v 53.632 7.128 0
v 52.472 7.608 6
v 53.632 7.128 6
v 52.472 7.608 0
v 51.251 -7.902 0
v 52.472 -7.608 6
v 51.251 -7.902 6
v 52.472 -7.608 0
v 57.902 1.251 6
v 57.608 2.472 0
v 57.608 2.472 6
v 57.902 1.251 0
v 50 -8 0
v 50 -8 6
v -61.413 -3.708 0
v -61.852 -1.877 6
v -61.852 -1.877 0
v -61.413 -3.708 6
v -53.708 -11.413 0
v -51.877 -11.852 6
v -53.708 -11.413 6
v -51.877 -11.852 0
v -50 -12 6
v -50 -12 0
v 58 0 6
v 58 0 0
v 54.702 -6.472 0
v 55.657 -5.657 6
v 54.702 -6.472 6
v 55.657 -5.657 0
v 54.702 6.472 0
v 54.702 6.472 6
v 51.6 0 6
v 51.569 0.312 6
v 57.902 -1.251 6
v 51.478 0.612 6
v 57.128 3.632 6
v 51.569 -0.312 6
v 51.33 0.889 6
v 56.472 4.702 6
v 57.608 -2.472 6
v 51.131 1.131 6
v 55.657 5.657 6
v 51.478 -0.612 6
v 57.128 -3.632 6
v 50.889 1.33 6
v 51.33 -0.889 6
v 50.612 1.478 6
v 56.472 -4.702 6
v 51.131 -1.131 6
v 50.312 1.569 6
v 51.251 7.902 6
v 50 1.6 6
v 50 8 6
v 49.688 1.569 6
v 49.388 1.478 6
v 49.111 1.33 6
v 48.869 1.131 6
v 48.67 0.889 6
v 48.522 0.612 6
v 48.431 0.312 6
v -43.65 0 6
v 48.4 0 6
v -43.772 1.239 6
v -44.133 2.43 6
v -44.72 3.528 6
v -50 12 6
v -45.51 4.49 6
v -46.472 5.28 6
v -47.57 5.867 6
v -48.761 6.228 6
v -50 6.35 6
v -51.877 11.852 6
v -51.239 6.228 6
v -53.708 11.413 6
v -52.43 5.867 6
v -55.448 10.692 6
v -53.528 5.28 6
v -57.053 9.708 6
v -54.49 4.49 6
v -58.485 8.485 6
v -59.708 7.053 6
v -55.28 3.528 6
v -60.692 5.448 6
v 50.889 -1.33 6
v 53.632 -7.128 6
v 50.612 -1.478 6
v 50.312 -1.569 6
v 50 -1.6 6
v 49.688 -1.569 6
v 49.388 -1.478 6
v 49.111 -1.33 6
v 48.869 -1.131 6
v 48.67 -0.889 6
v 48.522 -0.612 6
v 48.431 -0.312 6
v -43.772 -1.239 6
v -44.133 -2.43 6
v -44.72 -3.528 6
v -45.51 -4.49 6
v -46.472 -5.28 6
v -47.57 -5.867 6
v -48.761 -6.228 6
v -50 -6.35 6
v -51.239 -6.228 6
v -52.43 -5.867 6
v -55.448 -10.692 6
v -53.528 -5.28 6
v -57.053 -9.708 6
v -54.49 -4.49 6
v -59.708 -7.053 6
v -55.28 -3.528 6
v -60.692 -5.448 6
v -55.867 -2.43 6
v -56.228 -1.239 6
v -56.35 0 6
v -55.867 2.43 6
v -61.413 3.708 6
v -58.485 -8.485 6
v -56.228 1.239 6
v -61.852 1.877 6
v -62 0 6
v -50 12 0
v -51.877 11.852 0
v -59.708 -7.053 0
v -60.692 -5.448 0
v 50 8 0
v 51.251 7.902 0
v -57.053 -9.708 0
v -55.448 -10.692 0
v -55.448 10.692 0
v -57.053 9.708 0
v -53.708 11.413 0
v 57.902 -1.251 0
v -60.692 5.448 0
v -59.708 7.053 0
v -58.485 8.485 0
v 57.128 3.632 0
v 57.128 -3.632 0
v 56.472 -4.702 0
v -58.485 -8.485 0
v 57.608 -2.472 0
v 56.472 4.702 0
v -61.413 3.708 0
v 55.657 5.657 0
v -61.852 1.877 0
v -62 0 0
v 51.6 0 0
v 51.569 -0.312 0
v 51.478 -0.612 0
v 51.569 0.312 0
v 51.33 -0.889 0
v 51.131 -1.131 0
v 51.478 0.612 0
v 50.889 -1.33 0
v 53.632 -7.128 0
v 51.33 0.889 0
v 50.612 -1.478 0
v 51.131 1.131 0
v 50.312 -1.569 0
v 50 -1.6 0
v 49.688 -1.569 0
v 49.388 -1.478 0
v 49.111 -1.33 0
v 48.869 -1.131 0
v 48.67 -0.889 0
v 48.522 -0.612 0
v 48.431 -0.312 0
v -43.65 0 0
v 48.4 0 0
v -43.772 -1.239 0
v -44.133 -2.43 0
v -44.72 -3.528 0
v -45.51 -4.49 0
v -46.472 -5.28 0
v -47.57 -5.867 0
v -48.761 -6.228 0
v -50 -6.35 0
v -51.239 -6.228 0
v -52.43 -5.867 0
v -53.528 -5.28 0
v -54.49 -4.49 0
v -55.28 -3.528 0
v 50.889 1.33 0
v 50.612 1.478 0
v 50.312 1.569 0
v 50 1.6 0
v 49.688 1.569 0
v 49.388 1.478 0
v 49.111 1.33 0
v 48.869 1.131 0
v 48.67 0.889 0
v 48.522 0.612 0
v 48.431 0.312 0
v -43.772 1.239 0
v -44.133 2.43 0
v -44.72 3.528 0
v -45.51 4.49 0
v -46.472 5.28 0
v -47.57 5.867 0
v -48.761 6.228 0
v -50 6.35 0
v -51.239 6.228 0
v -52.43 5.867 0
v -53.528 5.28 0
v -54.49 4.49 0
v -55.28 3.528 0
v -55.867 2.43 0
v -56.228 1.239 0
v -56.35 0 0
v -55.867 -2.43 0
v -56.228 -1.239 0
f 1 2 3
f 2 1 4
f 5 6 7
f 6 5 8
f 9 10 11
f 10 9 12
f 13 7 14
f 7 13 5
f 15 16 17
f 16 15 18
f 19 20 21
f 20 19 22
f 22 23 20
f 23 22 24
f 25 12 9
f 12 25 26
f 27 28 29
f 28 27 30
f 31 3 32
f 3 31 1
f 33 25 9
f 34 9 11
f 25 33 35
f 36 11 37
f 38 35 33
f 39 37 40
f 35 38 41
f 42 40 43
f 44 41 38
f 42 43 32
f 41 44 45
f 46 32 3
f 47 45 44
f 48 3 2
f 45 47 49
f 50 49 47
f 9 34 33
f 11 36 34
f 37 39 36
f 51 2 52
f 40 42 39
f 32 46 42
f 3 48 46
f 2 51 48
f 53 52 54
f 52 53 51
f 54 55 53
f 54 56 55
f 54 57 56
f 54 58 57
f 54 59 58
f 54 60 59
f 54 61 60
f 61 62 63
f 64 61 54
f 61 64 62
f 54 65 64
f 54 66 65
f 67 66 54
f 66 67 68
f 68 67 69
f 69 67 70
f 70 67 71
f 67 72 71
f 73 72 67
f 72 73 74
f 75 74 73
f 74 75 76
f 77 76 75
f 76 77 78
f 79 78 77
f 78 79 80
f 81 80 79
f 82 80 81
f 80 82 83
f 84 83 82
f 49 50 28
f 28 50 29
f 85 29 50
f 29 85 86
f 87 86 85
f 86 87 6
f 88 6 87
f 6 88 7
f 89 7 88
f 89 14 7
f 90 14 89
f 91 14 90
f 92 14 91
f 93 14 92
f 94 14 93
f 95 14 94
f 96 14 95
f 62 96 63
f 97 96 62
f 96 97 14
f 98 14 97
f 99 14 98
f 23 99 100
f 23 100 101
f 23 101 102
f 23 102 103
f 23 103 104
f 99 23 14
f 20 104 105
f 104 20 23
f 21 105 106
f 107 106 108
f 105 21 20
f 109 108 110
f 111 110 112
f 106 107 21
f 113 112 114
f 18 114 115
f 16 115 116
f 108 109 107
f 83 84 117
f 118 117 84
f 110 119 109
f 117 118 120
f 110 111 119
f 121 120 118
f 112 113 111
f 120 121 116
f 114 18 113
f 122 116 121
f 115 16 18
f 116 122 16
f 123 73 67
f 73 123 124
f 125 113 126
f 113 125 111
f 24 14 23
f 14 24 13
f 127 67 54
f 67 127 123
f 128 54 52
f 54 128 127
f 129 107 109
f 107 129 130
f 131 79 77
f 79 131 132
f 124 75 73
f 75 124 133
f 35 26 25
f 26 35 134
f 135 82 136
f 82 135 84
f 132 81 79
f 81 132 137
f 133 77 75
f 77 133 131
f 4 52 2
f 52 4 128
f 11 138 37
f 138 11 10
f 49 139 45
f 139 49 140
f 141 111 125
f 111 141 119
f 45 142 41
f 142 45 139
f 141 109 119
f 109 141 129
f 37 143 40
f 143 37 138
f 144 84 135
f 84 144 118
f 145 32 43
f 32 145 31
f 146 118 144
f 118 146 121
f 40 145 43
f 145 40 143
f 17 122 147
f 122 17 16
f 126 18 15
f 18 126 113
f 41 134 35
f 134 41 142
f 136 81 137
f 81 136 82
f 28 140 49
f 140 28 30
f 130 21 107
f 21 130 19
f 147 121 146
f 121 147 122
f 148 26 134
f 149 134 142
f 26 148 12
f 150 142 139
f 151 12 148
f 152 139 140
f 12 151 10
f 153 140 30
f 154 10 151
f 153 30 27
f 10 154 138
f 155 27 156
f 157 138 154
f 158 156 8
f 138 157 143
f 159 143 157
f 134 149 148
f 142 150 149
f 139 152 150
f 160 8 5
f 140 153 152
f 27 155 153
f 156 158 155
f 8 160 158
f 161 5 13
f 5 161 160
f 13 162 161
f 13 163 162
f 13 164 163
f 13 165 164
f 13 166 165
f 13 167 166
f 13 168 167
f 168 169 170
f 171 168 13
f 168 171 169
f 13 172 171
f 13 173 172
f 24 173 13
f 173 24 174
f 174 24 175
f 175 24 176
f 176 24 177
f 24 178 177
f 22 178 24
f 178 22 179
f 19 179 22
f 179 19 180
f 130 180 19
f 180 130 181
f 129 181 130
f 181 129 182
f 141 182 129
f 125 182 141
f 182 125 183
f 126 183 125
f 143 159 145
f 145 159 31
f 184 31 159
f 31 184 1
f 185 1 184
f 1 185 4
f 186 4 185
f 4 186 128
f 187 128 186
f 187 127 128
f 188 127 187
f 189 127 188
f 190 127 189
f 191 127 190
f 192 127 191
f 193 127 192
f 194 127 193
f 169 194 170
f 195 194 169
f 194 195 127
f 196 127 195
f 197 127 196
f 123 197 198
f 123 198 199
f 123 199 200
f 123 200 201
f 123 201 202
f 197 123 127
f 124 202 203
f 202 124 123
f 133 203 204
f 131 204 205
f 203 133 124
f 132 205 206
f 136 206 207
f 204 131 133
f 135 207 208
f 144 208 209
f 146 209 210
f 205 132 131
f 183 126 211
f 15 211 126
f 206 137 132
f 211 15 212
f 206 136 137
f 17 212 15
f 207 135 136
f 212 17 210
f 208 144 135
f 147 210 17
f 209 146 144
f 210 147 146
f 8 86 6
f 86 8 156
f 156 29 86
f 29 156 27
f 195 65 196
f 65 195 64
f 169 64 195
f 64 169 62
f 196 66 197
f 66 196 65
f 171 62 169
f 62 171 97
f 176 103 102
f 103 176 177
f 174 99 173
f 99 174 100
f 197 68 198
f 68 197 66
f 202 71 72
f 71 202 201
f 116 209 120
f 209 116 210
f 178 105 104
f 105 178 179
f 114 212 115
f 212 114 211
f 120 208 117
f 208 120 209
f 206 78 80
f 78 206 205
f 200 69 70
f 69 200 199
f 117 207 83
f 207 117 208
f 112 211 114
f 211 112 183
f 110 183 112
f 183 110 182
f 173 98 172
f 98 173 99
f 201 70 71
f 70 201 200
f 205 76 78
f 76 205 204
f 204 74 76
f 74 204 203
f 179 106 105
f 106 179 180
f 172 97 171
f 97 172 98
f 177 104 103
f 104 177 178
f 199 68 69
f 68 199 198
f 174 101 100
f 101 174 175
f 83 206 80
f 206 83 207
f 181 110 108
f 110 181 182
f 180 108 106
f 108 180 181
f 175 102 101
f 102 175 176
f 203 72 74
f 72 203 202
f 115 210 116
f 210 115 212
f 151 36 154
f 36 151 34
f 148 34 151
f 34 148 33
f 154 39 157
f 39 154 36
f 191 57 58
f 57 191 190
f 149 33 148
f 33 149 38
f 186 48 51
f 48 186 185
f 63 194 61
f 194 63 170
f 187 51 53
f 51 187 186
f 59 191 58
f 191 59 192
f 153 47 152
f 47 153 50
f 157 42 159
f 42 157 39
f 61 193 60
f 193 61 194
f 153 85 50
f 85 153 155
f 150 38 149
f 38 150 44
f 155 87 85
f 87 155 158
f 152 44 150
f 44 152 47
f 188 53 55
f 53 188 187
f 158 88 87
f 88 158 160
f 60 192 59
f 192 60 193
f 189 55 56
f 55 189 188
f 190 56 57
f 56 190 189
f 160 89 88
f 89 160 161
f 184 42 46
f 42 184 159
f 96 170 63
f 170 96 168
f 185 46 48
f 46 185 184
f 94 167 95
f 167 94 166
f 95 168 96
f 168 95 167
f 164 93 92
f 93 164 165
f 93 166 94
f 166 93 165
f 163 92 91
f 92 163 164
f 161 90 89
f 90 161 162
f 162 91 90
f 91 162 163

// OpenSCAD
$fn = 32;

// ----------------------------------------------------------------------
// Lever: 100 mm between the bosses, 6 mm thick, smooth outline
// ----------------------------------------------------------------------

// --- parameters (mm) ---
lever_l = 100;            // distance between the boss centres
boss_a = 24;              // first boss diameter
boss_b = 16;              // second boss diameter
bore_a = 12.7;            // first bore
bore_b = 3.2;             // second bore
lever_t = 6;              // lever thickness

lever_profile = [[-62, 0], [-61.852, -1.877], [-61.413, -3.708], [-60.692, -5.448], [-59.708, -7.053], [-58.485, -8.485], [-57.053, -9.708], [-55.448, -10.692], [-53.708, -11.413], [-51.877, -11.852], [-50, -12], [50, -8], [51.251, -7.902], [52.472, -7.608], [53.632, -7.128], [54.702, -6.472], [55.657, -5.657], [56.472, -4.702], [57.128, -3.632], [57.608, -2.472], [57.902, -1.251], [58, 0], [57.902, 1.251], [57.608, 2.472], [57.128, 3.632], [56.472, 4.702], [55.657, 5.657], [54.702, 6.472], [53.632, 7.128], [52.472, 7.608], [51.251, 7.902], [50, 8], [-50, 12], [-51.877, 11.852], [-53.708, 11.413], [-55.448, 10.692], [-57.053, 9.708], [-58.485, 8.485], [-59.708, 7.053], [-60.692, 5.448], [-61.413, 3.708], [-61.852, 1.877]];

difference() {
  linear_extrude(height = lever_t) polygon(lever_profile);
  translate([-50, 0, -2.5]) cylinder(h = lever_t + 5, d = bore_a);
  translate([50, 0, -2.5]) cylinder(h = lever_t + 5, d = bore_b);
}
